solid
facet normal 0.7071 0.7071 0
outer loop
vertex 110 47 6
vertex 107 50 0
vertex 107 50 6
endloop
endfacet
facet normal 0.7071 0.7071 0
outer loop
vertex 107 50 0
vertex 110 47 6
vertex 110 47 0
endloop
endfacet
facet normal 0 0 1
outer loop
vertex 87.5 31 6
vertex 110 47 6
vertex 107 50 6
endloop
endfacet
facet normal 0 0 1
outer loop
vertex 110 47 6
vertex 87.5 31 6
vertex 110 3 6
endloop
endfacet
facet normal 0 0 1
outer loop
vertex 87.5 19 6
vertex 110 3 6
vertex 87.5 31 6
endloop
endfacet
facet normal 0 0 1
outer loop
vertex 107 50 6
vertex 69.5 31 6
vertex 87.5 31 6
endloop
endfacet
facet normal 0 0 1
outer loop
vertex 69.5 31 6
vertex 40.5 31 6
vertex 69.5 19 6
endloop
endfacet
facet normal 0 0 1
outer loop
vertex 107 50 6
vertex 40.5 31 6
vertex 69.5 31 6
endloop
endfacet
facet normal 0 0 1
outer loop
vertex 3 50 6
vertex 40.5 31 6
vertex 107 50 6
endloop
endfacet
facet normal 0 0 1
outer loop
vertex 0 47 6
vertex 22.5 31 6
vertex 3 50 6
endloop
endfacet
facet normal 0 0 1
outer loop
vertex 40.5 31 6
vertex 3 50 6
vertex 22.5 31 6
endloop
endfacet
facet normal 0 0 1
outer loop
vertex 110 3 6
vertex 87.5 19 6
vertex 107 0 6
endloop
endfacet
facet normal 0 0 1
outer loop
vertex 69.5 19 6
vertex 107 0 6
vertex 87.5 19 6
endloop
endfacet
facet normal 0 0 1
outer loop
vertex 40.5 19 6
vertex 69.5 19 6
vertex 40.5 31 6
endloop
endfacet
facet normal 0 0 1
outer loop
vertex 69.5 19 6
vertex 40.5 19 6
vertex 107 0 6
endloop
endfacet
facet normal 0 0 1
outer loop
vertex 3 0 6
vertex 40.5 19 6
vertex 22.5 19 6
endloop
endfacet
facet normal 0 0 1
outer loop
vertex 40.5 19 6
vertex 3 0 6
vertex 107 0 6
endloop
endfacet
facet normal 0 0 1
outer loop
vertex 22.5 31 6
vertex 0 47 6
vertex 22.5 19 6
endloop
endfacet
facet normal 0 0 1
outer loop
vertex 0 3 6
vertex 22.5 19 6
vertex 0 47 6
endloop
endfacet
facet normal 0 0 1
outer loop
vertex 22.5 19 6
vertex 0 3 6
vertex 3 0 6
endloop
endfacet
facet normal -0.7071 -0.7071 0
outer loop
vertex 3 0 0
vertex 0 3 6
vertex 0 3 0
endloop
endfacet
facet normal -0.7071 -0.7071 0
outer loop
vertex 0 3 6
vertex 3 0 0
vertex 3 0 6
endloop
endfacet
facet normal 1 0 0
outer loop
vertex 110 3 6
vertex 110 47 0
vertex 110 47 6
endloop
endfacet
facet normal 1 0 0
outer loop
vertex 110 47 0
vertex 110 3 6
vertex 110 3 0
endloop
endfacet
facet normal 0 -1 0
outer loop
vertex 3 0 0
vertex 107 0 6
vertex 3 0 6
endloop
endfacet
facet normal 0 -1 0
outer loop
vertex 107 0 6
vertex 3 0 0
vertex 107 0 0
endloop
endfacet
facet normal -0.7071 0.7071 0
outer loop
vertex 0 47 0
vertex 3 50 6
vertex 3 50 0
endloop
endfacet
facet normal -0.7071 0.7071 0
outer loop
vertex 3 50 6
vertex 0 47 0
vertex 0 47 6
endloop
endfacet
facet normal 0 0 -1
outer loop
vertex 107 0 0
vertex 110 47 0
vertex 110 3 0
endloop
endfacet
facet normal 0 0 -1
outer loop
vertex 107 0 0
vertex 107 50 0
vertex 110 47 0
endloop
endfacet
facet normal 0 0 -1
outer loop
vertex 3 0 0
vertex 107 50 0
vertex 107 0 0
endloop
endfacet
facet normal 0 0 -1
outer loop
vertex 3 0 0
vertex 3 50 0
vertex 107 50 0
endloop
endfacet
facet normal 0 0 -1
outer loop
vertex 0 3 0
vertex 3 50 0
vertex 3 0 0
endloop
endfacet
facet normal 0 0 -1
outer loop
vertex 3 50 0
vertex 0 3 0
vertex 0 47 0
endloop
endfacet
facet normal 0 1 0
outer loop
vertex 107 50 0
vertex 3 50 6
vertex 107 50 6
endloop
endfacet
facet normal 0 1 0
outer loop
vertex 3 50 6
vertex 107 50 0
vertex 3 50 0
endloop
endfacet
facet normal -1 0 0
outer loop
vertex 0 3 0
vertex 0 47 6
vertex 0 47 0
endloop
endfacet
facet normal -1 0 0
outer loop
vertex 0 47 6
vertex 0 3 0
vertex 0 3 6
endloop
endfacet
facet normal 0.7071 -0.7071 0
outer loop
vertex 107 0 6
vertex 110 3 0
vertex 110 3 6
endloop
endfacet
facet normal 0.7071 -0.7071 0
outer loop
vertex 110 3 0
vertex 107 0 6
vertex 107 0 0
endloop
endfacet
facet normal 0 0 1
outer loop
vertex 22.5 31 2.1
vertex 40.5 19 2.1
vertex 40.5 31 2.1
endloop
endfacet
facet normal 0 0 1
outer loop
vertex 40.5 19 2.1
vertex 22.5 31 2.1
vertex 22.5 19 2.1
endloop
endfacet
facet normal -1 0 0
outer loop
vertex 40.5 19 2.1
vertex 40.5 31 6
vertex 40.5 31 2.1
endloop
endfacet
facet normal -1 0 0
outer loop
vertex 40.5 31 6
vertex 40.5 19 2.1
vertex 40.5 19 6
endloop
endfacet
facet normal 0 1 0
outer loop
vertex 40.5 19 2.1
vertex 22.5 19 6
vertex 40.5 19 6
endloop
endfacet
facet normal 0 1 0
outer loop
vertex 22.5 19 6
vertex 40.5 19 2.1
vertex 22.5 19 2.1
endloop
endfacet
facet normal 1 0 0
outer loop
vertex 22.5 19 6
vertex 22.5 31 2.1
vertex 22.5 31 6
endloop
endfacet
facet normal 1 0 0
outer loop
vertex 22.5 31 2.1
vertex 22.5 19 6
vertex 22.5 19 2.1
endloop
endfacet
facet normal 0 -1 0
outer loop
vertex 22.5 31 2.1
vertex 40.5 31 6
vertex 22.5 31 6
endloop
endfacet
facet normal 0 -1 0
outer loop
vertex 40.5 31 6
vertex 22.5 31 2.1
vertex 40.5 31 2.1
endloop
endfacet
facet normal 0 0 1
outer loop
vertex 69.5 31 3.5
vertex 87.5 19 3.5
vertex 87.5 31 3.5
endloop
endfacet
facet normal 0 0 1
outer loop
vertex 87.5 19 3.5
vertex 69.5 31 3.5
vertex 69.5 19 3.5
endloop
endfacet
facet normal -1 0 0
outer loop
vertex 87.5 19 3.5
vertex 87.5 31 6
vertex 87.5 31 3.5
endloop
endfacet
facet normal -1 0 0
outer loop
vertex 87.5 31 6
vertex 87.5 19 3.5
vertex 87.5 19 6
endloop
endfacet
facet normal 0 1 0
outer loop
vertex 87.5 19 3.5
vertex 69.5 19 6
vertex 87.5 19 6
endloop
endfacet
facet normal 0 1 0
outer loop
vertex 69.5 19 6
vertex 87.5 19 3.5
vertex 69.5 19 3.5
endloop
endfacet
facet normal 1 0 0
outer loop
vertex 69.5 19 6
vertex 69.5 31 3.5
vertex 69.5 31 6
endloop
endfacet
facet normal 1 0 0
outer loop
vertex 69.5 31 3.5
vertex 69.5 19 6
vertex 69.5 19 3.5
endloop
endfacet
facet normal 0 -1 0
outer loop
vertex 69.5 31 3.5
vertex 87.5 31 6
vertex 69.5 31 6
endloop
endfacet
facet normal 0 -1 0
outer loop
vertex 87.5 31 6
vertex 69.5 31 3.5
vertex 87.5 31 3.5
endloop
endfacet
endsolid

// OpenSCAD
$fn = 32;

// ----------------------------------------------------------------------
// Windowed plate: 2 voids, 110 x 50 x 6 mm
// ----------------------------------------------------------------------

// --- parameters (mm) ---
plate_l = 110;            // plate length, X
plate_w = 50;             // plate width, Y
plate_t = 6;              // plate thickness, Z
edge_margin = 8;          // wall from the plate edge to any window
windows = 2;              // number of windows in the row
win_l = 18;               // window length
win_w = 12;               // window width
win_pitch = 47;           // window pitch along X
depth_1 = 3.9;            // depth of void 1 (full thickness = through)
depth_2 = 2.5;            // depth of void 2 (full thickness = through)
corner_c = 3;             // corner chamfer of the plate
fit_tol = 0.05;           // declared fit tolerance (prompt contract)
free_tol = 0.3;           // declared free tolerance (prompt contract)

profile = [[3, 0], [107, 0], [110, 3], [110, 47], [107, 50], [3, 50], [0, 47], [0, 3]];  // primary outline, 8 points, counter clockwise
void_1 = [[22.5, 19], [40.5, 19], [40.5, 31], [22.5, 31]];  // window 1 of the row, 4 points
void_2 = [[69.5, 19], [87.5, 19], [87.5, 31], [69.5, 31]];  // window 2 of the row, 4 points

// --- the one profile operation ---
difference() {
  linear_extrude(height = plate_t) polygon(points = profile);
  translate([0, 0, plate_t - depth_1])
    linear_extrude(height = depth_1 + 1) polygon(points = void_1);
  translate([0, 0, plate_t - depth_2])
    linear_extrude(height = depth_2 + 1) polygon(points = void_2);
}
